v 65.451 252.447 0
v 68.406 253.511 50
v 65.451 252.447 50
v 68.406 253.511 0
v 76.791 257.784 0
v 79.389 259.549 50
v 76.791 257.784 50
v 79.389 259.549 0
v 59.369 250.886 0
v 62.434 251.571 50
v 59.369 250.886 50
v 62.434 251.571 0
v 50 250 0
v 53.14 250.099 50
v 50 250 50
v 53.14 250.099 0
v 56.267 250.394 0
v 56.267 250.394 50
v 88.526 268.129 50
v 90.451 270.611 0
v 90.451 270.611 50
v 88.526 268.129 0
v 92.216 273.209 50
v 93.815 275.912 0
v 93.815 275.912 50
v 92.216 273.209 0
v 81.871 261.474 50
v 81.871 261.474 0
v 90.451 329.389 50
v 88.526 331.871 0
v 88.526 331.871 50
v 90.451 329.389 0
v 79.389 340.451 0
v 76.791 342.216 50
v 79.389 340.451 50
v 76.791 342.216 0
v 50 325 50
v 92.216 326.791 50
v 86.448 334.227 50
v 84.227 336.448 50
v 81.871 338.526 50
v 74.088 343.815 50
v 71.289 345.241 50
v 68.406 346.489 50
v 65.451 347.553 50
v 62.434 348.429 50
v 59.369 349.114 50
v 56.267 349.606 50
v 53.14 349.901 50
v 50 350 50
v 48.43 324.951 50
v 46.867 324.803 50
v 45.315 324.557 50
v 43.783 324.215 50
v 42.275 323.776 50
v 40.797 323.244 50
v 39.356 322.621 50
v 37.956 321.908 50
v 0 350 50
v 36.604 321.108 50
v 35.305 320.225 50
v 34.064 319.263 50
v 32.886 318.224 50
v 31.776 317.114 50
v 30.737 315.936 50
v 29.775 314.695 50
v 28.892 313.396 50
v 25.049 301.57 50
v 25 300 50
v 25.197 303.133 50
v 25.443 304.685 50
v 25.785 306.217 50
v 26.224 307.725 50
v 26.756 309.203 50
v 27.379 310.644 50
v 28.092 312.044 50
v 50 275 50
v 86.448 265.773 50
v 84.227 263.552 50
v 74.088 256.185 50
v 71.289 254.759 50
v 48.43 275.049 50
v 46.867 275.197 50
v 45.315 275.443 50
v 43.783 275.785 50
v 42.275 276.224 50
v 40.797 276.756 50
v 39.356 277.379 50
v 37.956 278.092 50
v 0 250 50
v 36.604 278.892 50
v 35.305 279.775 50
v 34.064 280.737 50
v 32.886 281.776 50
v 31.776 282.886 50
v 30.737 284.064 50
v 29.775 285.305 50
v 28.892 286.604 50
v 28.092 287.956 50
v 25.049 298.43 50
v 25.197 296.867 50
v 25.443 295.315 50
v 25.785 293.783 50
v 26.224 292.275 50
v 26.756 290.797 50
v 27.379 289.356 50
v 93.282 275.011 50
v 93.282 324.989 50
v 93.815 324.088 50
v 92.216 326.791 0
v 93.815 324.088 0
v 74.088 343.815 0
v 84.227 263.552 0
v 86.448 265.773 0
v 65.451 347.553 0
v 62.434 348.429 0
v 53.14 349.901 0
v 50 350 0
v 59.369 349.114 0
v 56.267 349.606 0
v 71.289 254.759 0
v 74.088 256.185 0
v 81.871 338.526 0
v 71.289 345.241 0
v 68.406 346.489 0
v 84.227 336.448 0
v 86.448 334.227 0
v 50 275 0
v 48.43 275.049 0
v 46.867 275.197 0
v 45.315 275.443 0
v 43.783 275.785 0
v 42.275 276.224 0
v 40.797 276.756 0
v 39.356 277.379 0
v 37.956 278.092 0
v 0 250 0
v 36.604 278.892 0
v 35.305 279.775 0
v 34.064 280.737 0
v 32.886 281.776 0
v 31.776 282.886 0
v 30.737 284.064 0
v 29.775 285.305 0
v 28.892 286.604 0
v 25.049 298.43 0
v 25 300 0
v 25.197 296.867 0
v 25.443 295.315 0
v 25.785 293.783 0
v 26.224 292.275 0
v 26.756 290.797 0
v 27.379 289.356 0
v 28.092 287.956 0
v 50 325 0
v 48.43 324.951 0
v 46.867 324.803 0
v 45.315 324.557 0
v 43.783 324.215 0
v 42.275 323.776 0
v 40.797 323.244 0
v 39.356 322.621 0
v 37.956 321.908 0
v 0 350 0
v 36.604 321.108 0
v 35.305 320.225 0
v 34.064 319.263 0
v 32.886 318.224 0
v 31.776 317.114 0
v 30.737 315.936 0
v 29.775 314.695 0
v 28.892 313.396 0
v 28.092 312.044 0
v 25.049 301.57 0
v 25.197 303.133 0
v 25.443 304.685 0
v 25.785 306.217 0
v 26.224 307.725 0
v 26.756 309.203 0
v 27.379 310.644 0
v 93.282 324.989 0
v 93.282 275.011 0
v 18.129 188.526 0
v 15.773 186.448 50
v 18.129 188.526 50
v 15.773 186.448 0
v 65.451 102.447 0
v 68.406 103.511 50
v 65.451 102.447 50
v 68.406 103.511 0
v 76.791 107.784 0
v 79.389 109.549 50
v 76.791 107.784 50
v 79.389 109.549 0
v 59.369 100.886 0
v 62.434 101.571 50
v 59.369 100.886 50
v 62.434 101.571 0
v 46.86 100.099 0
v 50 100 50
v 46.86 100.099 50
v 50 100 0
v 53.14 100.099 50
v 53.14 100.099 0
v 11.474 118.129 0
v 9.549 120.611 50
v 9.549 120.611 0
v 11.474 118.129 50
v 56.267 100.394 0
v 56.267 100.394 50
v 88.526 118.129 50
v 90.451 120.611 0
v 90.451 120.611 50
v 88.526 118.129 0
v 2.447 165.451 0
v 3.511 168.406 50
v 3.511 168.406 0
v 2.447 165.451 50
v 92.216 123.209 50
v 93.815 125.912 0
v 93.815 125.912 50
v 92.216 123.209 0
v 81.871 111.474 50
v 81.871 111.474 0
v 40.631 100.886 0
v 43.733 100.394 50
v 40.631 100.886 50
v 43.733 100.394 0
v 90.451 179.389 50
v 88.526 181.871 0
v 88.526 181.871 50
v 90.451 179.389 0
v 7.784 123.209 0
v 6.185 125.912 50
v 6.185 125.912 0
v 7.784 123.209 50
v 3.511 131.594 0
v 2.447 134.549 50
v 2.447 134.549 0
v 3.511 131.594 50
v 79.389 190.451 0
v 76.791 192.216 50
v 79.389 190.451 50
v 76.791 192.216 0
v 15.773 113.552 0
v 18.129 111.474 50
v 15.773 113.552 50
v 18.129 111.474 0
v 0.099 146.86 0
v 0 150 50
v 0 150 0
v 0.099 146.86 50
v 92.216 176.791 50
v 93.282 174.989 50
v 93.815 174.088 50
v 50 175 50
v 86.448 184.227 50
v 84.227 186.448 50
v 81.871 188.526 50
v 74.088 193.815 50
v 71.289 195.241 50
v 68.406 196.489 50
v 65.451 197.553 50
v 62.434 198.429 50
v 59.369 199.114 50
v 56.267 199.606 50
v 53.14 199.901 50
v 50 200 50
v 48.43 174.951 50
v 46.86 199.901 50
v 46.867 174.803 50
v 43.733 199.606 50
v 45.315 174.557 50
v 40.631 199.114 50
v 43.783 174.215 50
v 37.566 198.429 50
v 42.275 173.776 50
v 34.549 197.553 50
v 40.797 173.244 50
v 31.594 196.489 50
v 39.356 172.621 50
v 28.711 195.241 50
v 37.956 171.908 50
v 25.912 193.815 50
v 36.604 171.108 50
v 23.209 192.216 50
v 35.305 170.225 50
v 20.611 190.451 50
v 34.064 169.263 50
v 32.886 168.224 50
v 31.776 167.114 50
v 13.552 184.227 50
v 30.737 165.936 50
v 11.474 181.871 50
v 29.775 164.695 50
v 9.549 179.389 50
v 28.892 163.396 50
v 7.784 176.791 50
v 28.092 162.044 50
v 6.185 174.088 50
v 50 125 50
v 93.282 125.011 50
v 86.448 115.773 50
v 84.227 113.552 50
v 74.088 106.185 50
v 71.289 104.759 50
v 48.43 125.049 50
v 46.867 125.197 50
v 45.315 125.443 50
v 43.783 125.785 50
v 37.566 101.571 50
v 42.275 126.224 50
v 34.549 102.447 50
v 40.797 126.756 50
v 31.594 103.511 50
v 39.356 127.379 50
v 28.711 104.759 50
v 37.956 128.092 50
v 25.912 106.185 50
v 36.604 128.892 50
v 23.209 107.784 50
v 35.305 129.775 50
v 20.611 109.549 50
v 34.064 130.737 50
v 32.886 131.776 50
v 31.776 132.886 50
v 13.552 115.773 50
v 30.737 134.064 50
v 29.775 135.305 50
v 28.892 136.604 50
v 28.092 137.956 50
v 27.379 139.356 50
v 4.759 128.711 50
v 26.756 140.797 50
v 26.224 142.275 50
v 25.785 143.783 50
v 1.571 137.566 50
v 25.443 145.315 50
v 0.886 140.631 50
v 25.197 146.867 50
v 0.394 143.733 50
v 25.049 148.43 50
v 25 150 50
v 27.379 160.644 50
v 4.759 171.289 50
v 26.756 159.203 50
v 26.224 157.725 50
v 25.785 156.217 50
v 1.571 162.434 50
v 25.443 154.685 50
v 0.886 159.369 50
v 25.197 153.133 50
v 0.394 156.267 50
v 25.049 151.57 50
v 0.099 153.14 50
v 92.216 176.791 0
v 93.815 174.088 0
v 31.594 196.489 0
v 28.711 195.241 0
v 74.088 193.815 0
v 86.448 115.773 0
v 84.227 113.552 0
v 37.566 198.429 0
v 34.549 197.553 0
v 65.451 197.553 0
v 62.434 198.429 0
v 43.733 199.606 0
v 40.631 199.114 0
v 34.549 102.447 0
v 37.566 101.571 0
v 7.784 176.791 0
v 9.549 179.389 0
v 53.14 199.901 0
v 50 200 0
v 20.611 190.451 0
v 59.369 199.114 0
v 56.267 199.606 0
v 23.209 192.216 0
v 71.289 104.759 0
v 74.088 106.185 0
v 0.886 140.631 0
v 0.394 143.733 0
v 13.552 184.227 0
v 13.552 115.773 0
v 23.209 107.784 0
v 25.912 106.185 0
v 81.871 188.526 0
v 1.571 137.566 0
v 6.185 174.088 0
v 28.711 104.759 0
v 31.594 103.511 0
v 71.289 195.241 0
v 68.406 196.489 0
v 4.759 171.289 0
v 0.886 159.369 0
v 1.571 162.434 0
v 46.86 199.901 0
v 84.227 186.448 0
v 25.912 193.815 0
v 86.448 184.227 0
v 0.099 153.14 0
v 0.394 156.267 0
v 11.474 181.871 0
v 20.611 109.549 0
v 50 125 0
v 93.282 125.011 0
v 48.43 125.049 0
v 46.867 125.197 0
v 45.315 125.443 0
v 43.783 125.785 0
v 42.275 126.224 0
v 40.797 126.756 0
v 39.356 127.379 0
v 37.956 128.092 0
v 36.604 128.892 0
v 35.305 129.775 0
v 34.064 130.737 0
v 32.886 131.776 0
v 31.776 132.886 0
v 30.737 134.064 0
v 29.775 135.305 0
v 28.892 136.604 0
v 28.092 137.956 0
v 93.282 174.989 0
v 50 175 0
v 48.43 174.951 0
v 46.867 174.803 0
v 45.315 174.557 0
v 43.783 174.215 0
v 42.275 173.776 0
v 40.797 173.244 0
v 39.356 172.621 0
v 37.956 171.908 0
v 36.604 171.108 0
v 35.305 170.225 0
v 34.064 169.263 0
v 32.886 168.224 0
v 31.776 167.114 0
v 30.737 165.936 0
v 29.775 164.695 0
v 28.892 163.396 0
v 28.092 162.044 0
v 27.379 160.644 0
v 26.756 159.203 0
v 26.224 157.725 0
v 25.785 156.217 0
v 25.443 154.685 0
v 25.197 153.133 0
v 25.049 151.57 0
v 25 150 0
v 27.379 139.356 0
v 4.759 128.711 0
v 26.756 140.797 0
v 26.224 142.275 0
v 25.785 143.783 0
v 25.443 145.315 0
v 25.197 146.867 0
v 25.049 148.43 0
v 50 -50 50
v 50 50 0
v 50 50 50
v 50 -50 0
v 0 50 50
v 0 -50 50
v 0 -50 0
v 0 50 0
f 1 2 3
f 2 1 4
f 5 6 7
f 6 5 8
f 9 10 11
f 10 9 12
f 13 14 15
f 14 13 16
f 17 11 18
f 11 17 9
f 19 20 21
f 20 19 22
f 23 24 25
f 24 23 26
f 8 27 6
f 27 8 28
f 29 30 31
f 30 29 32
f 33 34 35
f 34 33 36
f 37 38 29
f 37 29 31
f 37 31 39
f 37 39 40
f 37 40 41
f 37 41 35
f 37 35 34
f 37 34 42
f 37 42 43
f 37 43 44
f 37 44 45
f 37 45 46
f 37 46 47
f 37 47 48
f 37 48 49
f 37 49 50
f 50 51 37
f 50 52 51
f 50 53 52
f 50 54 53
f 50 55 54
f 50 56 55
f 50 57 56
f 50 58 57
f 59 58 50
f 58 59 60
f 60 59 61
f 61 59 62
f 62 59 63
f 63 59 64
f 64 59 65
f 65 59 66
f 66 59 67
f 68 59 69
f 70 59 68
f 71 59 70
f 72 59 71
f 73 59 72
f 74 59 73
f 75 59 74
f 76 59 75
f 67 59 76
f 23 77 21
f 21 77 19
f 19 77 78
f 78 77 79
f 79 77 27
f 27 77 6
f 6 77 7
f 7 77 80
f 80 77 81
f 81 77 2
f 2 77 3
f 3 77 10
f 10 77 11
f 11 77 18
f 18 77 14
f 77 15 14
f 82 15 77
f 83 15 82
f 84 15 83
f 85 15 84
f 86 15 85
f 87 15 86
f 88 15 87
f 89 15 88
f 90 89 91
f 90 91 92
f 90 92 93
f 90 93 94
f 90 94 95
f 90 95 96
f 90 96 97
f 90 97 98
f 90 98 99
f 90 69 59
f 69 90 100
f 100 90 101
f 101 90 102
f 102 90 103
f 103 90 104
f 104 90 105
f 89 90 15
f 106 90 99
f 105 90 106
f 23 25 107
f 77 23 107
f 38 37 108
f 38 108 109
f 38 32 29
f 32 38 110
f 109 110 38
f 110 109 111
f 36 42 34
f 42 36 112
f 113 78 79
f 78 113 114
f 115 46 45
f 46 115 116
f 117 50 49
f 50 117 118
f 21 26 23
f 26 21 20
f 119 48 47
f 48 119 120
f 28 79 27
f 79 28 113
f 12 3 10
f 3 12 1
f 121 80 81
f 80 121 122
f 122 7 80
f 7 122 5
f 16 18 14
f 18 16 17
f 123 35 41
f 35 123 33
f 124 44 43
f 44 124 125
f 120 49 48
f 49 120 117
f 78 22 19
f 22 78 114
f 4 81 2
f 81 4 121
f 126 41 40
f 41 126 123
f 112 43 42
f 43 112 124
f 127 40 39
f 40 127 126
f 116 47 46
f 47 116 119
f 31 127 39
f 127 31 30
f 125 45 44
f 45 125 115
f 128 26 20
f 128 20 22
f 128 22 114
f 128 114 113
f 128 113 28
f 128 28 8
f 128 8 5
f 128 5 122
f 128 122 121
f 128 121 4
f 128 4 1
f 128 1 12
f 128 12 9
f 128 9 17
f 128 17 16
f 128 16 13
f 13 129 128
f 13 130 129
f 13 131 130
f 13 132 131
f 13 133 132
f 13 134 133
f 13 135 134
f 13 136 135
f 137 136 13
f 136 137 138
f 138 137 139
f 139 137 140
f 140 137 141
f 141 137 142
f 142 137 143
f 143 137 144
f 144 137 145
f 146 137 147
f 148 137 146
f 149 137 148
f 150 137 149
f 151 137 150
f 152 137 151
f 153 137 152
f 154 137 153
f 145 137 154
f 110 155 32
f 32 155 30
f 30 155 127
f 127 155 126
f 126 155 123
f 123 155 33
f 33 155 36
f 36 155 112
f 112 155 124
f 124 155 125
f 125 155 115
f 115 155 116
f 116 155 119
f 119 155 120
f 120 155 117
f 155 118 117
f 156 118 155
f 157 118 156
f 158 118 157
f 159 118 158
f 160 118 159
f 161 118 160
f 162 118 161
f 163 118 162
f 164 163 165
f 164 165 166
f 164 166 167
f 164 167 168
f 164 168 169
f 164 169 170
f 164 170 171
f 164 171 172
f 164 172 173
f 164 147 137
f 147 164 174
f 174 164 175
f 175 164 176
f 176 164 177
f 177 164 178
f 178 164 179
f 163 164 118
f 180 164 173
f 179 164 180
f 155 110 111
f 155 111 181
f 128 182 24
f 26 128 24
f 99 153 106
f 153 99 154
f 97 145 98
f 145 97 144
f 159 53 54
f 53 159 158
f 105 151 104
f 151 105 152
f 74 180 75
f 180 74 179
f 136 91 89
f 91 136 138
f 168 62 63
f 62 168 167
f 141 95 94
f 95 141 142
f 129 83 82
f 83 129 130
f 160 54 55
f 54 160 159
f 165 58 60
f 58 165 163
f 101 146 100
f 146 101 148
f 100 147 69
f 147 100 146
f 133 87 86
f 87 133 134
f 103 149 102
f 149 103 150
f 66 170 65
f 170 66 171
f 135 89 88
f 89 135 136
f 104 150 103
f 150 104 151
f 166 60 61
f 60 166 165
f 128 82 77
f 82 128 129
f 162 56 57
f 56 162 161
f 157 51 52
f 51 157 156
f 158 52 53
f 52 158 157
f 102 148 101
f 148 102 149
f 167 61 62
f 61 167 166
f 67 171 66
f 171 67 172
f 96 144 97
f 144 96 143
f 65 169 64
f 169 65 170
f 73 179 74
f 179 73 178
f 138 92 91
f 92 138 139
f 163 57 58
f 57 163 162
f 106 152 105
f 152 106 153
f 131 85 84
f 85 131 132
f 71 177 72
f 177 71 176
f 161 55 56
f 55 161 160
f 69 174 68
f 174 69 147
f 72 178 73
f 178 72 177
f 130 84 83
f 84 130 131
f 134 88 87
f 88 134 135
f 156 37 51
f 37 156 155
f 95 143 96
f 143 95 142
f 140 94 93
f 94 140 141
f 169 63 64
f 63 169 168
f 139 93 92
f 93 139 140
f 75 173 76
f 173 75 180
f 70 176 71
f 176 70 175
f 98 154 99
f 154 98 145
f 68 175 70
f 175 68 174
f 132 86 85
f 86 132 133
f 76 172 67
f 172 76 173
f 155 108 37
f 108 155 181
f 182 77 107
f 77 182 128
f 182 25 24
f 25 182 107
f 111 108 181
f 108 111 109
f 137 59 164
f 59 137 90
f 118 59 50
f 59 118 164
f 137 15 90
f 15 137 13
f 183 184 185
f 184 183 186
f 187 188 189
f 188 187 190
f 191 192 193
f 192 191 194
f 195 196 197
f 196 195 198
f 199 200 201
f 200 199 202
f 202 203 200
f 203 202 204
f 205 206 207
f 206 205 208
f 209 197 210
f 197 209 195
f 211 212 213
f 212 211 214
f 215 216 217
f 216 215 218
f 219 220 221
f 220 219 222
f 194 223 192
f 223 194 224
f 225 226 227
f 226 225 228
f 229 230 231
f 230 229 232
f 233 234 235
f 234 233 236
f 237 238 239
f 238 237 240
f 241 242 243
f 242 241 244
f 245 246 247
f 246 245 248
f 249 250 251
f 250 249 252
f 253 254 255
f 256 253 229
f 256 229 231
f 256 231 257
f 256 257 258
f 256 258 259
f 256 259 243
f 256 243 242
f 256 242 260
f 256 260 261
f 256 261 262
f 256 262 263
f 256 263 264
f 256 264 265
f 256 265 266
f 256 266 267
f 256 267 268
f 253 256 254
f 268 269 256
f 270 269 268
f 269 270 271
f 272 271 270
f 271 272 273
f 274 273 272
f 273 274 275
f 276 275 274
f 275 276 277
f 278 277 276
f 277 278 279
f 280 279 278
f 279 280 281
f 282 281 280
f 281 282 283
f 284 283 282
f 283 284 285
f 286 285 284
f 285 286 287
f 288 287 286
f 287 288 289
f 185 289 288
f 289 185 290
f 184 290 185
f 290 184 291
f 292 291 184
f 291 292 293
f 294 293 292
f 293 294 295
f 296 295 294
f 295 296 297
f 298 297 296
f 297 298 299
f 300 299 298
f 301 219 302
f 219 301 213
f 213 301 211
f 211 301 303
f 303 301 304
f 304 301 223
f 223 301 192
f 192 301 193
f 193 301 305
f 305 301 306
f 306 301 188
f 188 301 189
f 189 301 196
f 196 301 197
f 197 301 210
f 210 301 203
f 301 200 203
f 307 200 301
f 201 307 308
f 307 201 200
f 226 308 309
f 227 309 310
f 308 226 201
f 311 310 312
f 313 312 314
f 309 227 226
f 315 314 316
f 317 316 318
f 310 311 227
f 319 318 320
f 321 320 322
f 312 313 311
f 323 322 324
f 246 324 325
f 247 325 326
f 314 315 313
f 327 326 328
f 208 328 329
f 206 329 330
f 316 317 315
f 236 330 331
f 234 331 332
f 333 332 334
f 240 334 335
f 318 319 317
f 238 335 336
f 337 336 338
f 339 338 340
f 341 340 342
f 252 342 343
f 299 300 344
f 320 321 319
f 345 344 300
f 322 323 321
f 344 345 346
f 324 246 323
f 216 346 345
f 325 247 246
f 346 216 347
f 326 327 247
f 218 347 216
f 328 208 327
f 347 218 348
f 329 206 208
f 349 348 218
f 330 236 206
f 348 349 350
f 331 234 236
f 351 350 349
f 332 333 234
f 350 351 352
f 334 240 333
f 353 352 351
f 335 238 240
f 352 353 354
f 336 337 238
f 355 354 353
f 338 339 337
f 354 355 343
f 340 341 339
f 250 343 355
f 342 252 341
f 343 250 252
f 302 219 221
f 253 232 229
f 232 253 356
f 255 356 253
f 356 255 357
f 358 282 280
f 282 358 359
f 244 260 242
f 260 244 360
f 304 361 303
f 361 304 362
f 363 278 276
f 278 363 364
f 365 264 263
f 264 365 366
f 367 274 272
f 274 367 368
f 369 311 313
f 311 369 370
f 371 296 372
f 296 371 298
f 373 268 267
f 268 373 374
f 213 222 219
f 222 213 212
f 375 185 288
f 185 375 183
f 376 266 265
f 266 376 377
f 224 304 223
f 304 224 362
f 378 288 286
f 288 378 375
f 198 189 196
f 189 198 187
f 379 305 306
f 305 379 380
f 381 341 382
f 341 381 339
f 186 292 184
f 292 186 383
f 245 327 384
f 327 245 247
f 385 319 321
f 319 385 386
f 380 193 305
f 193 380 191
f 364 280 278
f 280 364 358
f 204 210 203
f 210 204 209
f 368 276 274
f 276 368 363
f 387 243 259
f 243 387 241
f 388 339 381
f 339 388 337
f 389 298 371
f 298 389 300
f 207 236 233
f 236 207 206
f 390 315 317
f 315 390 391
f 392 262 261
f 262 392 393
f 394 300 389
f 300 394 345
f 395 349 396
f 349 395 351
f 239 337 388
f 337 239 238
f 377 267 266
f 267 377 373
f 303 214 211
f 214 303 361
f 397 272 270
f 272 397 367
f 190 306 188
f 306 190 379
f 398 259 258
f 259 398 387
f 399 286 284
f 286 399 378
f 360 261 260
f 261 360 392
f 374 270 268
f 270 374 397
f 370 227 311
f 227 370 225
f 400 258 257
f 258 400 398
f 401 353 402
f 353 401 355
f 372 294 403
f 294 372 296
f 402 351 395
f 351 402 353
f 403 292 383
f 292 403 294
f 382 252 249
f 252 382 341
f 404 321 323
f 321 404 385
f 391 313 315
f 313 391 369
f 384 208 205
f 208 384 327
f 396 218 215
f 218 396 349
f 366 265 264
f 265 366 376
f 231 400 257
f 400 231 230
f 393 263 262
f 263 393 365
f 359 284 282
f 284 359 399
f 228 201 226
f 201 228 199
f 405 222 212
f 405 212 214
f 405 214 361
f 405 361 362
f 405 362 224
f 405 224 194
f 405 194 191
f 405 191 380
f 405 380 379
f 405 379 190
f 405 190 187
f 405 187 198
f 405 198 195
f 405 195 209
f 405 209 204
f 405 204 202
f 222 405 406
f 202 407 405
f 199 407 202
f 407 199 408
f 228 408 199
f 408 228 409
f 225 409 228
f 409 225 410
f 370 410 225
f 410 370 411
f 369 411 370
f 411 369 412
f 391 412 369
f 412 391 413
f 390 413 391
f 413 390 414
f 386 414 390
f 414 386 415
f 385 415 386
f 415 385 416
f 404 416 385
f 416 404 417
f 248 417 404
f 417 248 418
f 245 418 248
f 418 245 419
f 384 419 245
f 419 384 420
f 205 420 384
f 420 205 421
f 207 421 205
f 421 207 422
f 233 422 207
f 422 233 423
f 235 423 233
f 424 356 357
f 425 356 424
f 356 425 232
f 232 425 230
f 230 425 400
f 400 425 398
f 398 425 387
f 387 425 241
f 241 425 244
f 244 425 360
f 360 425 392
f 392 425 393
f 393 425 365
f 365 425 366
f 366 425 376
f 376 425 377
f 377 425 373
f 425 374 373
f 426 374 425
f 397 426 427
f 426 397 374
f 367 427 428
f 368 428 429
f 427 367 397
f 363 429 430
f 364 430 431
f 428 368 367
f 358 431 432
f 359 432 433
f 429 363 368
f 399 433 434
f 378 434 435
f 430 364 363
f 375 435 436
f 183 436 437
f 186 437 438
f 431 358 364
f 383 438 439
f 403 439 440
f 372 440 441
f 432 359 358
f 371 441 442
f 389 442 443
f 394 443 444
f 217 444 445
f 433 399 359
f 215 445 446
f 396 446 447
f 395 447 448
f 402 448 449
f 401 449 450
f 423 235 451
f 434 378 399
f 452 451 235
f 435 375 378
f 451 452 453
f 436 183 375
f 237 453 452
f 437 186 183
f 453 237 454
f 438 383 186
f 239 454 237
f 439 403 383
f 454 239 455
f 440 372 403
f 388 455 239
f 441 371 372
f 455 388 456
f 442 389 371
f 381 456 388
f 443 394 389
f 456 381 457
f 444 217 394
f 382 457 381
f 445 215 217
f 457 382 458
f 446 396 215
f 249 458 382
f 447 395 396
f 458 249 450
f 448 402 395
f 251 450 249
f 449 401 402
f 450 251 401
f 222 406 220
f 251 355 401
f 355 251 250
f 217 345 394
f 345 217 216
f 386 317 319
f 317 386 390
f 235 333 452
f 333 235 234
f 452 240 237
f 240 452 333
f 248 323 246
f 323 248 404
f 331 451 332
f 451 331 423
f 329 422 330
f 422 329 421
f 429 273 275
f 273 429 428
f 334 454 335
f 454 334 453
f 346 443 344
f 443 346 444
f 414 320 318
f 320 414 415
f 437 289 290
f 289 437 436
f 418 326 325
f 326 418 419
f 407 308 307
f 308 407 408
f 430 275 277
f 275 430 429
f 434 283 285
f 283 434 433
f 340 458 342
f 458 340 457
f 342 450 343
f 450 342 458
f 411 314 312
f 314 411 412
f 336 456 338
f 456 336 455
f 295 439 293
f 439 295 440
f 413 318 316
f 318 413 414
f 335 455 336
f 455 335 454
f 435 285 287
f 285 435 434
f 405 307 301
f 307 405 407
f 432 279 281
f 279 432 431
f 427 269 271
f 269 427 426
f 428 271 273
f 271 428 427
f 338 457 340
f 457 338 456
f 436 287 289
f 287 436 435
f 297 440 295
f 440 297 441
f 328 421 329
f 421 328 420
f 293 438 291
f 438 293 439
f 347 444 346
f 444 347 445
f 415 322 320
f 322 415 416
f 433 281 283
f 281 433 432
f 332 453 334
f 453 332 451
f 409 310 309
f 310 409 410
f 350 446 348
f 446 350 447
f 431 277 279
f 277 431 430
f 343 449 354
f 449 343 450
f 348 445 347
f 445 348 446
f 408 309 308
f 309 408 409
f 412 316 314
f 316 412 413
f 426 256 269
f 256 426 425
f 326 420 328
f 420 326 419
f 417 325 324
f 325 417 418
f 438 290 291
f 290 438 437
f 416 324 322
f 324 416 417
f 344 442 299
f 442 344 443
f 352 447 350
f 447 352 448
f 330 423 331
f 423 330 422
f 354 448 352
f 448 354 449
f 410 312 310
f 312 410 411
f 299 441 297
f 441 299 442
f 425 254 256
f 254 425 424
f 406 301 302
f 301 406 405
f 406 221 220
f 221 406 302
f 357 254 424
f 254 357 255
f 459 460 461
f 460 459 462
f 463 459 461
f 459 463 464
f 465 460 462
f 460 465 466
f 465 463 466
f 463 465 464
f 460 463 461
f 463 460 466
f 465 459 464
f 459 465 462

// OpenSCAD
$fn=100;
$vpt=[80,150,0];
$vpr=[40,0,90];
$vpd=600;
use <../../lib.scad>

module block(){
	translate([0,-50,0]){
		cube([50,100,50]);}}

module claw(){
	render(){
		translate(forward(50)){
			annulus(ro=50,ri=25,t=50,
							cut_tangent=true,
							cut_symmetric=true);}}}

slid_dist=100*sin($t*180)^2;

translate(right(300)){
	color("green"){
		render(){
			outer_glue(){
				translate(forward(slid_dist)){
					claw();}
				block();}}}}

translate(right(150)+forward(slid_dist)){
	color("red"){
		claw();}}

color("blue"){
	block();}
